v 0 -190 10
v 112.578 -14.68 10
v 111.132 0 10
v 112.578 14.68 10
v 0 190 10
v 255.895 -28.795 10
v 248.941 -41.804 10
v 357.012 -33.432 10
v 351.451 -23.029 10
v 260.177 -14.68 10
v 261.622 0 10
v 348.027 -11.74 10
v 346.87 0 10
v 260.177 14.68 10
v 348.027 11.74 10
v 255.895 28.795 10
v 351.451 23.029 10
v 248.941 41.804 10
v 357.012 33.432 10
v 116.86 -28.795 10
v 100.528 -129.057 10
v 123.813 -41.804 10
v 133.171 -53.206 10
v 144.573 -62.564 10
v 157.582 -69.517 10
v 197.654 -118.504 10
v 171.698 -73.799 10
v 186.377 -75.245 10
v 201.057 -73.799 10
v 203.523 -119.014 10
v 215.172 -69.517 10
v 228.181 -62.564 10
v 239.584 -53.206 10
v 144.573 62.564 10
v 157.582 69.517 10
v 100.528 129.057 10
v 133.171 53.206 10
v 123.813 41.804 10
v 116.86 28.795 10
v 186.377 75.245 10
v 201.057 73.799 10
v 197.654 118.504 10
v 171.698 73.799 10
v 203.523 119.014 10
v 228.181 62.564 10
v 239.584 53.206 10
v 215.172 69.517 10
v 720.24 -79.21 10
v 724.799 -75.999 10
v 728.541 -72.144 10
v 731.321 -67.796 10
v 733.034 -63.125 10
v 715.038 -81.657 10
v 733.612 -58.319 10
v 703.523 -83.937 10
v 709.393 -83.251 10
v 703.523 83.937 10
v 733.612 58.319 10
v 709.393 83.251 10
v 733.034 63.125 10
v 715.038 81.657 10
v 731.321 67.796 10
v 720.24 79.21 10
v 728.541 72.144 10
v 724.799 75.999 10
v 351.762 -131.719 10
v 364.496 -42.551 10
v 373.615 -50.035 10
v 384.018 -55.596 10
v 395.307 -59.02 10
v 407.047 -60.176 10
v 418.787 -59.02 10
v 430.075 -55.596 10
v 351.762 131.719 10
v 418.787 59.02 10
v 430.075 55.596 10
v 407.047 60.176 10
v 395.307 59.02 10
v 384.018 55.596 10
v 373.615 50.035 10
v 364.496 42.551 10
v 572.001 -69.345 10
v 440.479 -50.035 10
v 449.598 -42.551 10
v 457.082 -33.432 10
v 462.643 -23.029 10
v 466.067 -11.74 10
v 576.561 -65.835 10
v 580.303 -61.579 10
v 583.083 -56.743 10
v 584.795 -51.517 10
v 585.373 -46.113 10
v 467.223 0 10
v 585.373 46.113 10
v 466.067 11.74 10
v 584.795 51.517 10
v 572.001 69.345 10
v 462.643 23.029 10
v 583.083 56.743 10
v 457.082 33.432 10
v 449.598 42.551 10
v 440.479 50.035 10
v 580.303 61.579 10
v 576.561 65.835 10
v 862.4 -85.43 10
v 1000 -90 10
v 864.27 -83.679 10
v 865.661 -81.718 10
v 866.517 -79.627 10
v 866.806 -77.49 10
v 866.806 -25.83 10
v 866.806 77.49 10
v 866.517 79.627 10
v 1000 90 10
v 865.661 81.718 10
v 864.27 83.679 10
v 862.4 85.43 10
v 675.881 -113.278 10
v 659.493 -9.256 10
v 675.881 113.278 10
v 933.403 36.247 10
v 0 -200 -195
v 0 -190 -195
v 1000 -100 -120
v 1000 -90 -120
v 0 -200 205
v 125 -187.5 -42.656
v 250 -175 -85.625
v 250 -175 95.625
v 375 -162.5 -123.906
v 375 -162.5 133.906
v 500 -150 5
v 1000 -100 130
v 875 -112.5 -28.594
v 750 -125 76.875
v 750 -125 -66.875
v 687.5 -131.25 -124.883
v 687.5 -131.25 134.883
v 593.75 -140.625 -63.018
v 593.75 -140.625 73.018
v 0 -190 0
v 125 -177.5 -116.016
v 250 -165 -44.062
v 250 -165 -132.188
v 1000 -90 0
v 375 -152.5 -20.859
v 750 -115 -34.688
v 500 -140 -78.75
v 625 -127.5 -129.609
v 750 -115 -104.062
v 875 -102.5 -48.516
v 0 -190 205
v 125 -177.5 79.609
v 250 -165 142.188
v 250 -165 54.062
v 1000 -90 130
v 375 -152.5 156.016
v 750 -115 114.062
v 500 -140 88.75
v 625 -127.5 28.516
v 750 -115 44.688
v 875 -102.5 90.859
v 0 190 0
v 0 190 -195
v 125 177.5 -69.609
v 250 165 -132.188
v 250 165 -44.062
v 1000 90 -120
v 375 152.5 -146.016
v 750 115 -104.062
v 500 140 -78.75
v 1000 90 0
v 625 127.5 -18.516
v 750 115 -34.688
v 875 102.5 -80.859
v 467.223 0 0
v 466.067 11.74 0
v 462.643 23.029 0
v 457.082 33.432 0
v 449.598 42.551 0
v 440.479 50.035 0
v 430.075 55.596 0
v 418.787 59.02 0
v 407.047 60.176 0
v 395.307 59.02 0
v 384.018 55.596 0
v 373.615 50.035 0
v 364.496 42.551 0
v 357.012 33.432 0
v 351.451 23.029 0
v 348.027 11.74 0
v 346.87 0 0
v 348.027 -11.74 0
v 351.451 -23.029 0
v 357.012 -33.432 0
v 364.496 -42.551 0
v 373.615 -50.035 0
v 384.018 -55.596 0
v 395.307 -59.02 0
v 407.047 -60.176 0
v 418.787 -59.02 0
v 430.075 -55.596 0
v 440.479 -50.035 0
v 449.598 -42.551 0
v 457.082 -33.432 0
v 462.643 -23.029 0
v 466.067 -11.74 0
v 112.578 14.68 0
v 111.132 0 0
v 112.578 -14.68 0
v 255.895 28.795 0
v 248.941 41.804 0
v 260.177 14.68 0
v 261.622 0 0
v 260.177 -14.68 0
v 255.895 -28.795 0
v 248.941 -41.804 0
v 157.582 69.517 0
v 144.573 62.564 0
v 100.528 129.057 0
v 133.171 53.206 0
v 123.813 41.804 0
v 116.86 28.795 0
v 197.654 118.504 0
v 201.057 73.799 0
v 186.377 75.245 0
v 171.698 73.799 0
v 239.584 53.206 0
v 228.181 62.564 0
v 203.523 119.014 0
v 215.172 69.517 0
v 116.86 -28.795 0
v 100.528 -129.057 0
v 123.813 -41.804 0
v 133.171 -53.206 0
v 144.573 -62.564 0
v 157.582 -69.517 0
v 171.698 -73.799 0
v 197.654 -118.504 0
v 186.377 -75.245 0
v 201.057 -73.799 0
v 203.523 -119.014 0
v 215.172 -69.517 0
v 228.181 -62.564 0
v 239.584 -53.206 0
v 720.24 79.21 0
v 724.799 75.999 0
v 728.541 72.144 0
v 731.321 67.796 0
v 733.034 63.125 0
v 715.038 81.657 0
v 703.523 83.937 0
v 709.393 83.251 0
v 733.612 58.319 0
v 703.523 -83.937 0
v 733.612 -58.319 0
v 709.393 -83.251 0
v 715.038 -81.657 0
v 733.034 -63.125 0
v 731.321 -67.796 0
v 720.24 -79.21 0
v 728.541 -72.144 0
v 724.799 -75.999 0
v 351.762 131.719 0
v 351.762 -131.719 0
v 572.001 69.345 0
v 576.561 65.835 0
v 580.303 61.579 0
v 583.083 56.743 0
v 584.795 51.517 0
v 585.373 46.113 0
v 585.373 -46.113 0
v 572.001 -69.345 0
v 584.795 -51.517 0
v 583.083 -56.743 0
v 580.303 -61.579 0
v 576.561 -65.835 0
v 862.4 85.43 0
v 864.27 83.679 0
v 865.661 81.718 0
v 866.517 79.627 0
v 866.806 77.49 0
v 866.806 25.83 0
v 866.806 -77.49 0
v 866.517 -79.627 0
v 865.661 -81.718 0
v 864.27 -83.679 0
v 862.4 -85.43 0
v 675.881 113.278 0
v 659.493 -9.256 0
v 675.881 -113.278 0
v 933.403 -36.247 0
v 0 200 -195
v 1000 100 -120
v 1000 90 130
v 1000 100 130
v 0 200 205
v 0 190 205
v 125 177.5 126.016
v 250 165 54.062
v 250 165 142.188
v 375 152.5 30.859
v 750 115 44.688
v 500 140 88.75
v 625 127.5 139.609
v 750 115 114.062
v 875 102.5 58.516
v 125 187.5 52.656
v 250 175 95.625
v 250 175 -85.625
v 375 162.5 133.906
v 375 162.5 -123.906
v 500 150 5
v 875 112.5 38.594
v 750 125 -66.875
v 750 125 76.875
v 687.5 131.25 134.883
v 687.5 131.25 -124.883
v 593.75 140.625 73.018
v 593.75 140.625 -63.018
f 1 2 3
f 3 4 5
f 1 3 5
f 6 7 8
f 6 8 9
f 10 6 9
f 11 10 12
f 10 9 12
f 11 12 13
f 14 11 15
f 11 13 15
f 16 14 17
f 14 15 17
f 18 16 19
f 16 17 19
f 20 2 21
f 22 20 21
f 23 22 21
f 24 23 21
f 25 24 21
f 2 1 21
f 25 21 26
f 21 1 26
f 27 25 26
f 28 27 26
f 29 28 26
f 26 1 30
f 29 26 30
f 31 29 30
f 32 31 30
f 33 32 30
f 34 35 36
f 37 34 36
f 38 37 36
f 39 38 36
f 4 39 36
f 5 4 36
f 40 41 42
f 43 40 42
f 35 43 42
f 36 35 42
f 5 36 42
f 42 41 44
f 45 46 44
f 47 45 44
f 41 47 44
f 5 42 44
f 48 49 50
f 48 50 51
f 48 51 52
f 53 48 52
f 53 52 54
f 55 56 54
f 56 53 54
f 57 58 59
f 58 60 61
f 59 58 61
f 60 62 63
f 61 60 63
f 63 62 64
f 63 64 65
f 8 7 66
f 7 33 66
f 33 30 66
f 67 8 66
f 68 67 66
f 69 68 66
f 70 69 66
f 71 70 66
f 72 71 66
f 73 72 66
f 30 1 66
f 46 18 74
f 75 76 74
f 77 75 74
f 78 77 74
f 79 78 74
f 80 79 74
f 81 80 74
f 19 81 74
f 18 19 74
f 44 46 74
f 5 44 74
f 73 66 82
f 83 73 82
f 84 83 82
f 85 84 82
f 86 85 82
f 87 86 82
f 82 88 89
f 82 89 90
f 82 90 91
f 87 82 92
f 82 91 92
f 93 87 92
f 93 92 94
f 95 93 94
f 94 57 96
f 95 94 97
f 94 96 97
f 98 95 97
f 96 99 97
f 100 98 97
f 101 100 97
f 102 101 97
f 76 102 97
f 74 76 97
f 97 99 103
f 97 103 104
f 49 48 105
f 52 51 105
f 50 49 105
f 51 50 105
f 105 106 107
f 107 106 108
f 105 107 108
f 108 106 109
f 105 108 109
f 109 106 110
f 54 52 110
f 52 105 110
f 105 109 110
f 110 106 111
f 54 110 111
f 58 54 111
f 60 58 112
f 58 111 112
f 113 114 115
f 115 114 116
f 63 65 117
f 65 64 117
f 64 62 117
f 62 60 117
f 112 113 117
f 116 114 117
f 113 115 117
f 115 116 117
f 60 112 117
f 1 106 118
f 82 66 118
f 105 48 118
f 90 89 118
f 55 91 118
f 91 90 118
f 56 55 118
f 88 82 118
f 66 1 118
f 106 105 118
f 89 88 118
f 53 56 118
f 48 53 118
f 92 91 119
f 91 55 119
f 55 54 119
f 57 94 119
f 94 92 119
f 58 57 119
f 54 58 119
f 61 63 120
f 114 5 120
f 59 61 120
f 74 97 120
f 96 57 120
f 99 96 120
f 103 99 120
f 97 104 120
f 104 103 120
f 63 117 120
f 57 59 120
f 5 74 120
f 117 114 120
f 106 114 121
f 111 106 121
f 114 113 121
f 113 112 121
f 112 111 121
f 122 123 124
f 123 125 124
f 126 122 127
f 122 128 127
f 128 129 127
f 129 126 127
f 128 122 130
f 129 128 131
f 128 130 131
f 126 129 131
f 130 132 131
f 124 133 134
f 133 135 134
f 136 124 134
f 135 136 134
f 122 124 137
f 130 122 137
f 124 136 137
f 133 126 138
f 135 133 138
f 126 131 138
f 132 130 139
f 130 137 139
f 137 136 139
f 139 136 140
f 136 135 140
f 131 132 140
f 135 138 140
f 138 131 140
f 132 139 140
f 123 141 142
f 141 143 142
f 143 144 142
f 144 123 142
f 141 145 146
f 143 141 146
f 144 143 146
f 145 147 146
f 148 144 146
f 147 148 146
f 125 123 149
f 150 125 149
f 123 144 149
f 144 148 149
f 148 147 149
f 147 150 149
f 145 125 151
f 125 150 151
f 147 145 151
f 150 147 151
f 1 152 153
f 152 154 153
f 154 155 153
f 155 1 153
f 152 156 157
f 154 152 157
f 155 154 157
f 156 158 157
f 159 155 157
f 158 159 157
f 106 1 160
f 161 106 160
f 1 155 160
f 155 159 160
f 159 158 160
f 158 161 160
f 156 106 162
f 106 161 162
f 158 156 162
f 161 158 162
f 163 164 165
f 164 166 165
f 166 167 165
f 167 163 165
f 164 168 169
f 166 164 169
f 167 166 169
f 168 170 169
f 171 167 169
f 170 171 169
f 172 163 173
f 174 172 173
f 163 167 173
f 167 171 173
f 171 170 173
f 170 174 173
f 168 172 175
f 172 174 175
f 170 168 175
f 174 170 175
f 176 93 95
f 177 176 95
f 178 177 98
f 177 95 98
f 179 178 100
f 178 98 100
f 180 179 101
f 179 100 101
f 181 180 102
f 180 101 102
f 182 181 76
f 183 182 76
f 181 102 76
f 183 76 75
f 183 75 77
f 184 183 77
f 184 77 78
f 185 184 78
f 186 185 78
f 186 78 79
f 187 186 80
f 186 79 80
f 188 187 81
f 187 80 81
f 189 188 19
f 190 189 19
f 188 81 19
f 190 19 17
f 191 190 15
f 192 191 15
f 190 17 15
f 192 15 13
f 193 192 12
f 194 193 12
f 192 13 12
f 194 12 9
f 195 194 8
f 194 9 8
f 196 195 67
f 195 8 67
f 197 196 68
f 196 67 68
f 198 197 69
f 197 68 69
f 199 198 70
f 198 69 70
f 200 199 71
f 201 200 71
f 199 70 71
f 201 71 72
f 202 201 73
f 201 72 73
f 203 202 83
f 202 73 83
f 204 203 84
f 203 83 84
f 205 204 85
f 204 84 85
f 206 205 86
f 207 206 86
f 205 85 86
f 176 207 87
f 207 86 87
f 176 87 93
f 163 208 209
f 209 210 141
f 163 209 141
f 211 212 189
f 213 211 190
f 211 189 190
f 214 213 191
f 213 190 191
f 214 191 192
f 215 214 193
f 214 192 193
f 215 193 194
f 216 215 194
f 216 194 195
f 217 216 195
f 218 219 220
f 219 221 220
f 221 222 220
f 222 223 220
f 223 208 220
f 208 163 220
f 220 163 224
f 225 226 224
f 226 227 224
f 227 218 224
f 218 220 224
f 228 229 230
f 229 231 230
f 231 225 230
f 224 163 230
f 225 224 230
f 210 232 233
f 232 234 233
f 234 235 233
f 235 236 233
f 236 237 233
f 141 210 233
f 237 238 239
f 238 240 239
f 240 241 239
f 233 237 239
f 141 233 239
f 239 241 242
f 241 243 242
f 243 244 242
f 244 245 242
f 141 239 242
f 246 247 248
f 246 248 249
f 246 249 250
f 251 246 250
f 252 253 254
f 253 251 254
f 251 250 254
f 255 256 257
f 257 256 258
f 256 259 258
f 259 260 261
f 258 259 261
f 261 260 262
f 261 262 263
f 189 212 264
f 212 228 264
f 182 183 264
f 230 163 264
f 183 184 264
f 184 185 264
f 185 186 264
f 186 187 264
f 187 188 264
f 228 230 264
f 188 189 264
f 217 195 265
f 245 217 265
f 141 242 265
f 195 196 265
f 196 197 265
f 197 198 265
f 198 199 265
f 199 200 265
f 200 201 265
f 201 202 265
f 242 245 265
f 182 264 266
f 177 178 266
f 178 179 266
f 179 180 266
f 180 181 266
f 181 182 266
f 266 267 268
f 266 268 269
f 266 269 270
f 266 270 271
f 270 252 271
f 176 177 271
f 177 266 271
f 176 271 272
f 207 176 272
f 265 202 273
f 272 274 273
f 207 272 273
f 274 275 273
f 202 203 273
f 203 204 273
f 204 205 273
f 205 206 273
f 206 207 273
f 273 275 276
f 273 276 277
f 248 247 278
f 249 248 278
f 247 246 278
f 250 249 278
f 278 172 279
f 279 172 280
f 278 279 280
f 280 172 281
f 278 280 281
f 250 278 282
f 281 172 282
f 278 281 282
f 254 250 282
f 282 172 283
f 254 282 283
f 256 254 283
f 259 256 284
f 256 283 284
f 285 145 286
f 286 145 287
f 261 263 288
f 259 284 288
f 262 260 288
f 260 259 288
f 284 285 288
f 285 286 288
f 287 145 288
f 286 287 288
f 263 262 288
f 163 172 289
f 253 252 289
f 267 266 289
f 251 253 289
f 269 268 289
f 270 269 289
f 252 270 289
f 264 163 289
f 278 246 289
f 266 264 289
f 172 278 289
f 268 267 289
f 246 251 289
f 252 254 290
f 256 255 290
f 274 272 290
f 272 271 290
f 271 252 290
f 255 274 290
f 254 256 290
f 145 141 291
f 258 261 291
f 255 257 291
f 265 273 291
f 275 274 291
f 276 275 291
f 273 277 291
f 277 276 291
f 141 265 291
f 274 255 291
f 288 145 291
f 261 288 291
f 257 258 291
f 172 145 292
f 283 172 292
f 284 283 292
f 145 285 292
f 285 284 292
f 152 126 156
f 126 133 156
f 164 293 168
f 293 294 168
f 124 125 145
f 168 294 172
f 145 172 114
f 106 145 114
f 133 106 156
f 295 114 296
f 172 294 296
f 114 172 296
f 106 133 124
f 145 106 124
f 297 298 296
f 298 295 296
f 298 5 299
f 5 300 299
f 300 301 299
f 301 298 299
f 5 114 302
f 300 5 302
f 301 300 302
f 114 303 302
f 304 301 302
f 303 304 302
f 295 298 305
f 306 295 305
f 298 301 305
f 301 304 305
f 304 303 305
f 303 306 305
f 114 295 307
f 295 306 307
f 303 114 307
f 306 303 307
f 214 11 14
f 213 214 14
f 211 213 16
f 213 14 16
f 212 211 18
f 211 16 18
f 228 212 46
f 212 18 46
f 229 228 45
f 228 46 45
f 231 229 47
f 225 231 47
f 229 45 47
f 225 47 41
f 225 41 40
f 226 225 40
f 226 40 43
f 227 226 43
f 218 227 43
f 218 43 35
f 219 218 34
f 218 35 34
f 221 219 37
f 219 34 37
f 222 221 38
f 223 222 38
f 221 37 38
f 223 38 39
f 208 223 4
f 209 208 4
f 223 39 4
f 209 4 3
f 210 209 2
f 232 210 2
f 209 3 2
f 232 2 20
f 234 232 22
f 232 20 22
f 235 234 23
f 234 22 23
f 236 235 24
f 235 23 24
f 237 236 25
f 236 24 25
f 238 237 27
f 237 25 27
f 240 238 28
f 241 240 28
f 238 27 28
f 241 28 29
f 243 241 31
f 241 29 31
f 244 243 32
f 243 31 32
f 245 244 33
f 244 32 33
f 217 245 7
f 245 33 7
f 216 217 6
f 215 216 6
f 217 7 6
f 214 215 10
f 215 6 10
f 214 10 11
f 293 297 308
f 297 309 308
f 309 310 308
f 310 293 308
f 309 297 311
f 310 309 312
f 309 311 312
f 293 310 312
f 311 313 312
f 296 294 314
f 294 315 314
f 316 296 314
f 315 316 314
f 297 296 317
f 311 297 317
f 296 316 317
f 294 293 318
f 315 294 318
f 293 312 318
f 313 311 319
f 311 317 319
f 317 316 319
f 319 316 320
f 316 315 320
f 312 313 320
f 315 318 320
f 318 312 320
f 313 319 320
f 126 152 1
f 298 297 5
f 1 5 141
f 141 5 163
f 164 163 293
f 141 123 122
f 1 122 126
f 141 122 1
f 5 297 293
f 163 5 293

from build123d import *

# Parameters (mm, degrees)
SKETCH5_R          = 75.245114963
SKETCH5_R_2        = 60.176466442
CUT_EXTRUDE1_DEPTH = 10


with BuildPart() as part:
    # Sketch1 → Loft4 section 0
    with BuildSketch(Plane(origin=(0, 0, 0), x_dir=(0, 0, -1), z_dir=(1, 0, 0))):
        Polygon((-205, 200), (195, 200), (195, 190), (0, 190), (0, -190), (195, -190), (195, -200), (-205, -200), (-205, -190), (-10, -190), (-10, 190), (-205, 190), align=None)
    # Sketch4 → Loft4 section 1
    with BuildSketch(Plane(origin=(1000, 0, -1000), x_dir=(0, 0, 1), z_dir=(-1, 0, 0))):
        Polygon((880, 100), (1130, 100), (1130, 90), (1010, 90), (1010, -90), (1130, -90), (1130, -100), (880, -100), (880, -90), (1000, -90), (1000, 90), (880, 90), align=None)
    loft()

    # Sketch5 → Cut-Extrude1 (cut)
    with BuildSketch(Plane.XY.offset(10)):
        with Locations((186.377200583, 0)):
            Circle(SKETCH5_R)
        with Locations((407.046905619, 0)):
            Circle(SKETCH5_R_2)
    extrude(amount=-CUT_EXTRUDE1_DEPTH, mode=Mode.SUBTRACT)


solid = part.part
